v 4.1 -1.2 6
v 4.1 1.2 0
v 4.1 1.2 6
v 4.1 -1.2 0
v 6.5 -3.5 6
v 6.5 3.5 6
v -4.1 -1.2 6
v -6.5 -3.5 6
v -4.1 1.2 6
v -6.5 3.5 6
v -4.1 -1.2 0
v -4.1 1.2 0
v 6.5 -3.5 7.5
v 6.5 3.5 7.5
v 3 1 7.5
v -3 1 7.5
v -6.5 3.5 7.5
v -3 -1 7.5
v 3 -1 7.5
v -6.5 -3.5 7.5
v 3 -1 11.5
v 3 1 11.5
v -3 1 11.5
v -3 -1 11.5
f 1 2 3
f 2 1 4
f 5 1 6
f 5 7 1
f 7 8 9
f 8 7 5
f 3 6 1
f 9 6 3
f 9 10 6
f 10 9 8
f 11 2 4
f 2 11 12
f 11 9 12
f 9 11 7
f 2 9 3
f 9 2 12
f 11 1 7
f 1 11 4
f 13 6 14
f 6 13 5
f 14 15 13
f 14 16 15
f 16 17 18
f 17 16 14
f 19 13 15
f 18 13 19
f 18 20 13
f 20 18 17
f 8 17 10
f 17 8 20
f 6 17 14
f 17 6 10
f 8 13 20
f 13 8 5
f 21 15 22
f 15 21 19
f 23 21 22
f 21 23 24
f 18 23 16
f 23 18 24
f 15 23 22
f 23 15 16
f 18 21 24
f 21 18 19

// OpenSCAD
// file: ../00_common/parameters.scad
// =============================================================================
// OpenMotorBridge - Global CAD Parameters & Settings
// =============================================================================
// File: hardware/cad/scad/00_common/parameters.scad
// Description: Global dimensional constants, manufacturing clearances and
//              circle resolution ($fn) for all OpenSCAD modules.
// =============================================================================

// --- 1. Circle & Curve Resolution ---
$fn = 60; // Smooth cylinders and holes for high-quality MJF 3D printing

// --- 2. Central Main Box Dimensions (3-Tier Sandwich) ---
MAIN_BOX_OUTER_L      = 110.0; // Outer length in X (mm)
MAIN_BOX_OUTER_W      = 74.0;  // Outer width in Y (mm)
MAIN_BOX_LOWER_H      = 17.0;  // Lower case height in Z (mm)
MAIN_BOX_MID_H        = 15.0;  // Mid tray height in Z (mm)
MAIN_BOX_LID_H        = 4.0;   // Lid plate thickness in Z (mm)
MAIN_BOX_WALL         = 2.5;   // Nominal wall thickness (mm)
MAIN_BOX_CORNER_POST  = 5.0;   // Corner clamping screw post size (mm)

// --- 3. Satellite Pod Dimensions (Universal Enlarged Envelope) ---
POD_OUTER_L           = 135.0; // Outer length in X (mm)
POD_OUTER_W           = 70.0;  // Outer width in Y (mm)
POD_OUTER_H           = 38.0;  // Outer height in Z (mm)
POD_WALL              = 3.5;   // Nominal wall thickness (mm)
POD_BULKHEAD_X        = 18.0;  // Partition bulkhead position in X (mm)
POD_CHAMBER_L         = 117.0; // Sliding chamber length in X (mm)
POD_CHAMBER_W         = 63.0;  // Sliding chamber width in Y (mm)
POD_CHAMBER_H         = 31.0;  // Sliding chamber height in Z (mm)

// --- 4. Pod Linear Guide Rails (Poka-Yoke Tongue & Groove) ---
POD_GROOVE_W          = 3.0;   // Internal guide groove width in Z (mm)
POD_GROOVE_DEPTH      = 1.5;   // Internal guide groove depth in Y (mm)
POD_GROOVE_LEFT_Z     = 10.0;  // Center height of left groove (mm)
POD_GROOVE_RIGHT_Z    = 18.0;  // Center height of right groove (mm, asym offset)

CARTRIDGE_TONGUE_W    = 2.6;   // Cartridge tongue rail height in Z (mm, 0.2mm clearance)
CARTRIDGE_TONGUE_PROT = 1.4;   // Cartridge tongue protrusion in Y (mm, 0.1mm clearance)
CARTRIDGE_CHAMFER_L   = 4.0;   // 30° lead-in chamfer nose length (mm)

// --- 5. Cartridge Dimensions (Enlarged Universal Sled) ---
CARTRIDGE_BASE_L      = 116.0; // Sled length in X (mm)
CARTRIDGE_BASE_W      = 58.0;  // Sled width in Y (mm)
CARTRIDGE_BASE_H      = 28.0;  // Sled height in Z (mm)
CARTRIDGE_FACE_L      = 4.0;   // Front faceplate thickness in X (mm)
CARTRIDGE_FACE_W      = 64.0;  // Front faceplate width in Y (mm)
CARTRIDGE_FACE_H      = 34.0;  // Front faceplate height in Z (mm)

// --- 5a. RF Interface & Sealing Dimensions ---
SMA_BORE_R            = 3.25;  // Ø 6.5 mm through-hole for standard SMA bulkhead
SMA_ORECESS_R         = 4.75;  // Ø 9.5 mm recess for waterproof silicone O-ring
SMA_ORECESS_DEPTH     = 1.2;   // 1.2 mm deep O-ring compression pocket

// --- 6. Thermal Copper Studs (Kühlbolzen) ---
COPPER_STUD_DIA       = 8.0;   // Diameter of thermal copper studs (mm)
COPPER_STUD_R         = COPPER_STUD_DIA / 2.0; // Radius = 4.0 mm

// Main Box Thermal Stud Positions (4x in lower case floor)
MAIN_BOX_CU_POS = [
    [35.0, 25.0], // Position 1 (LM5164 DCDC Buck Regulator)
    [45.0, 25.0], // Position 2 (BQ25798 LiPo Charger)
    [30.0, 48.0], // Position 3 (ESP32-S3 Dual-Core SoC)
    [70.0, 40.0]  // Position 4 (Automotive TVS & LC Filter Zone)
];

// Pod & Cartridge Thermal Stud Positions (2x in floor)
POD_CU_POS = [
    [42.0, 30.0], // Forward thermal zone
    [72.0, 30.0]  // Rearward thermal zone
];

// --- 7. Screw & Clearance Dimensions ---
M2_SCREW_HOLE_R       = 1.1;   // M2 clearance hole (r = 1.1 mm -> Ø 2.2 mm)
M2_5_SCREW_HOLE_R     = 1.4;   // M2.5 clearance hole (r = 1.4 mm -> Ø 2.8 mm)
M3_SCREW_HOLE_R       = 1.65;  // M3 clearance hole (r = 1.65 mm -> Ø 3.3 mm)
M4_SCREW_HOLE_R       = 2.2;   // M4 clearance hole (r = 2.2 mm -> Ø 4.4 mm)
M8_BORE_R             = 4.0;   // M8 cable through-bore (r = 4.0 mm -> Ø 8.0 mm)
M8_STUDS_OUTER_R      = 6.0;   // M8 neck outer radius (Ø 12.0 mm)

// --- 8. Universal Front Node Enclosure Dimensions ---
FRONT_NODE_PCB_L      = 68.0;  // PCB length in X (mm)
FRONT_NODE_PCB_W      = 44.0;  // PCB width in Y (mm)
FRONT_NODE_PCB_H      = 1.6;   // PCB thickness in Z (mm)
FRONT_NODE_PCB_R      = 2.5;   // PCB corner radius (mm)

FRONT_NODE_CHAMBER_L  = 72.0;  // Internal chamber length in X (mm, 2mm margin)
FRONT_NODE_CHAMBER_W  = 48.0;  // Internal chamber width in Y (mm, 2mm margin)
FRONT_NODE_TUB_H      = 16.0;  // Lower tub depth in Z (mm)
FRONT_NODE_LID_H      = 7.0;   // Upper lid height in Z (mm)
FRONT_NODE_WALL       = 2.5;   // Wall thickness in HP MJF PA12 (mm)
FRONT_NODE_CORNER_R   = 4.0;   // Outer enclosure corner radius (mm)

FRONT_NODE_OUTER_L    = FRONT_NODE_CHAMBER_L + 2 * FRONT_NODE_WALL + 7.0; // 84.0 mm
FRONT_NODE_OUTER_W    = FRONT_NODE_CHAMBER_W + 2 * FRONT_NODE_WALL + 7.0; // 60.0 mm
FRONT_NODE_OUTER_H    = FRONT_NODE_TUB_H + FRONT_NODE_LID_H;              // 23.0 mm

// PCB Standoff Heights & Radii
FRONT_NODE_STANDOFF_H = 3.0;   // Height of PCB standoffs from floor (mm)
FRONT_NODE_STANDOFF_R = 3.0;   // Outer radius of M2.5 screw bosses (mm)
FRONT_NODE_INSERT_R   = 1.7;   // Core hole for Ruthex M2.5 heat-set inserts (Ø 3.4 mm)

// AMPS 4-Hole Mounting Pattern (38 x 30 mm, M4 threaded inserts)
AMPS_SPACING_X        = 38.0;  // AMPS hole distance in X (mm)
AMPS_SPACING_Y        = 30.0;  // AMPS hole distance in Y (mm)
AMPS_INSERT_R         = 2.3;   // Core hole for Ruthex M4 heat-set inserts (Ø 4.6 mm)

// Acoustic Vent for Knowles SPH0645 MEMS
FRONT_NODE_MIC_HOLE_R = 1.25;  // Sound canal radius (Ø 2.5 mm)
FRONT_NODE_MIC_MEMB_R = 3.0;   // Gore ePTFE membrane pocket radius (Ø 6.0 mm)
FRONT_NODE_MIC_MEMB_D = 0.8;   // Membrane pocket depth (mm)
// main file
// =============================================================================
// OpenMotorBridge - Front Node: USB-C Service Port Protective Cap
// =============================================================================
// File: hardware/cad/scad/04_front_node/03_front_node_usbc_plug.scad
// Description: IP67 silicone / TPU protective sealing cap for USB-C service port
//              with retaining collar and finger tab.
// =============================================================================

include <../00_common/parameters.scad>;

module front_node_usbc_plug() {
    color([0.2, 0.2, 0.2, 0.9]) // Black elastomer
    union() {
        // 1. USB-C Receptacle Male Insert (snug fit into TYPE-C-31-M-12)
        translate([-4.1, -1.2, 0])
            cube(size=[8.2, 2.4, 6.0], center=false);
            
        // 2. Outer Waterproof Sealing Flange Collar
        translate([-6.5, -3.5, 6.0])
            cube(size=[13.0, 7.0, 1.5], center=false);
            
        // 3. Ergonomic Pull Tab / Lanyard Loop
        translate([-3.0, -1.0, 7.5])
            cube(size=[6.0, 2.0, 4.0], center=false);
    }
}

front_node_usbc_plug();
